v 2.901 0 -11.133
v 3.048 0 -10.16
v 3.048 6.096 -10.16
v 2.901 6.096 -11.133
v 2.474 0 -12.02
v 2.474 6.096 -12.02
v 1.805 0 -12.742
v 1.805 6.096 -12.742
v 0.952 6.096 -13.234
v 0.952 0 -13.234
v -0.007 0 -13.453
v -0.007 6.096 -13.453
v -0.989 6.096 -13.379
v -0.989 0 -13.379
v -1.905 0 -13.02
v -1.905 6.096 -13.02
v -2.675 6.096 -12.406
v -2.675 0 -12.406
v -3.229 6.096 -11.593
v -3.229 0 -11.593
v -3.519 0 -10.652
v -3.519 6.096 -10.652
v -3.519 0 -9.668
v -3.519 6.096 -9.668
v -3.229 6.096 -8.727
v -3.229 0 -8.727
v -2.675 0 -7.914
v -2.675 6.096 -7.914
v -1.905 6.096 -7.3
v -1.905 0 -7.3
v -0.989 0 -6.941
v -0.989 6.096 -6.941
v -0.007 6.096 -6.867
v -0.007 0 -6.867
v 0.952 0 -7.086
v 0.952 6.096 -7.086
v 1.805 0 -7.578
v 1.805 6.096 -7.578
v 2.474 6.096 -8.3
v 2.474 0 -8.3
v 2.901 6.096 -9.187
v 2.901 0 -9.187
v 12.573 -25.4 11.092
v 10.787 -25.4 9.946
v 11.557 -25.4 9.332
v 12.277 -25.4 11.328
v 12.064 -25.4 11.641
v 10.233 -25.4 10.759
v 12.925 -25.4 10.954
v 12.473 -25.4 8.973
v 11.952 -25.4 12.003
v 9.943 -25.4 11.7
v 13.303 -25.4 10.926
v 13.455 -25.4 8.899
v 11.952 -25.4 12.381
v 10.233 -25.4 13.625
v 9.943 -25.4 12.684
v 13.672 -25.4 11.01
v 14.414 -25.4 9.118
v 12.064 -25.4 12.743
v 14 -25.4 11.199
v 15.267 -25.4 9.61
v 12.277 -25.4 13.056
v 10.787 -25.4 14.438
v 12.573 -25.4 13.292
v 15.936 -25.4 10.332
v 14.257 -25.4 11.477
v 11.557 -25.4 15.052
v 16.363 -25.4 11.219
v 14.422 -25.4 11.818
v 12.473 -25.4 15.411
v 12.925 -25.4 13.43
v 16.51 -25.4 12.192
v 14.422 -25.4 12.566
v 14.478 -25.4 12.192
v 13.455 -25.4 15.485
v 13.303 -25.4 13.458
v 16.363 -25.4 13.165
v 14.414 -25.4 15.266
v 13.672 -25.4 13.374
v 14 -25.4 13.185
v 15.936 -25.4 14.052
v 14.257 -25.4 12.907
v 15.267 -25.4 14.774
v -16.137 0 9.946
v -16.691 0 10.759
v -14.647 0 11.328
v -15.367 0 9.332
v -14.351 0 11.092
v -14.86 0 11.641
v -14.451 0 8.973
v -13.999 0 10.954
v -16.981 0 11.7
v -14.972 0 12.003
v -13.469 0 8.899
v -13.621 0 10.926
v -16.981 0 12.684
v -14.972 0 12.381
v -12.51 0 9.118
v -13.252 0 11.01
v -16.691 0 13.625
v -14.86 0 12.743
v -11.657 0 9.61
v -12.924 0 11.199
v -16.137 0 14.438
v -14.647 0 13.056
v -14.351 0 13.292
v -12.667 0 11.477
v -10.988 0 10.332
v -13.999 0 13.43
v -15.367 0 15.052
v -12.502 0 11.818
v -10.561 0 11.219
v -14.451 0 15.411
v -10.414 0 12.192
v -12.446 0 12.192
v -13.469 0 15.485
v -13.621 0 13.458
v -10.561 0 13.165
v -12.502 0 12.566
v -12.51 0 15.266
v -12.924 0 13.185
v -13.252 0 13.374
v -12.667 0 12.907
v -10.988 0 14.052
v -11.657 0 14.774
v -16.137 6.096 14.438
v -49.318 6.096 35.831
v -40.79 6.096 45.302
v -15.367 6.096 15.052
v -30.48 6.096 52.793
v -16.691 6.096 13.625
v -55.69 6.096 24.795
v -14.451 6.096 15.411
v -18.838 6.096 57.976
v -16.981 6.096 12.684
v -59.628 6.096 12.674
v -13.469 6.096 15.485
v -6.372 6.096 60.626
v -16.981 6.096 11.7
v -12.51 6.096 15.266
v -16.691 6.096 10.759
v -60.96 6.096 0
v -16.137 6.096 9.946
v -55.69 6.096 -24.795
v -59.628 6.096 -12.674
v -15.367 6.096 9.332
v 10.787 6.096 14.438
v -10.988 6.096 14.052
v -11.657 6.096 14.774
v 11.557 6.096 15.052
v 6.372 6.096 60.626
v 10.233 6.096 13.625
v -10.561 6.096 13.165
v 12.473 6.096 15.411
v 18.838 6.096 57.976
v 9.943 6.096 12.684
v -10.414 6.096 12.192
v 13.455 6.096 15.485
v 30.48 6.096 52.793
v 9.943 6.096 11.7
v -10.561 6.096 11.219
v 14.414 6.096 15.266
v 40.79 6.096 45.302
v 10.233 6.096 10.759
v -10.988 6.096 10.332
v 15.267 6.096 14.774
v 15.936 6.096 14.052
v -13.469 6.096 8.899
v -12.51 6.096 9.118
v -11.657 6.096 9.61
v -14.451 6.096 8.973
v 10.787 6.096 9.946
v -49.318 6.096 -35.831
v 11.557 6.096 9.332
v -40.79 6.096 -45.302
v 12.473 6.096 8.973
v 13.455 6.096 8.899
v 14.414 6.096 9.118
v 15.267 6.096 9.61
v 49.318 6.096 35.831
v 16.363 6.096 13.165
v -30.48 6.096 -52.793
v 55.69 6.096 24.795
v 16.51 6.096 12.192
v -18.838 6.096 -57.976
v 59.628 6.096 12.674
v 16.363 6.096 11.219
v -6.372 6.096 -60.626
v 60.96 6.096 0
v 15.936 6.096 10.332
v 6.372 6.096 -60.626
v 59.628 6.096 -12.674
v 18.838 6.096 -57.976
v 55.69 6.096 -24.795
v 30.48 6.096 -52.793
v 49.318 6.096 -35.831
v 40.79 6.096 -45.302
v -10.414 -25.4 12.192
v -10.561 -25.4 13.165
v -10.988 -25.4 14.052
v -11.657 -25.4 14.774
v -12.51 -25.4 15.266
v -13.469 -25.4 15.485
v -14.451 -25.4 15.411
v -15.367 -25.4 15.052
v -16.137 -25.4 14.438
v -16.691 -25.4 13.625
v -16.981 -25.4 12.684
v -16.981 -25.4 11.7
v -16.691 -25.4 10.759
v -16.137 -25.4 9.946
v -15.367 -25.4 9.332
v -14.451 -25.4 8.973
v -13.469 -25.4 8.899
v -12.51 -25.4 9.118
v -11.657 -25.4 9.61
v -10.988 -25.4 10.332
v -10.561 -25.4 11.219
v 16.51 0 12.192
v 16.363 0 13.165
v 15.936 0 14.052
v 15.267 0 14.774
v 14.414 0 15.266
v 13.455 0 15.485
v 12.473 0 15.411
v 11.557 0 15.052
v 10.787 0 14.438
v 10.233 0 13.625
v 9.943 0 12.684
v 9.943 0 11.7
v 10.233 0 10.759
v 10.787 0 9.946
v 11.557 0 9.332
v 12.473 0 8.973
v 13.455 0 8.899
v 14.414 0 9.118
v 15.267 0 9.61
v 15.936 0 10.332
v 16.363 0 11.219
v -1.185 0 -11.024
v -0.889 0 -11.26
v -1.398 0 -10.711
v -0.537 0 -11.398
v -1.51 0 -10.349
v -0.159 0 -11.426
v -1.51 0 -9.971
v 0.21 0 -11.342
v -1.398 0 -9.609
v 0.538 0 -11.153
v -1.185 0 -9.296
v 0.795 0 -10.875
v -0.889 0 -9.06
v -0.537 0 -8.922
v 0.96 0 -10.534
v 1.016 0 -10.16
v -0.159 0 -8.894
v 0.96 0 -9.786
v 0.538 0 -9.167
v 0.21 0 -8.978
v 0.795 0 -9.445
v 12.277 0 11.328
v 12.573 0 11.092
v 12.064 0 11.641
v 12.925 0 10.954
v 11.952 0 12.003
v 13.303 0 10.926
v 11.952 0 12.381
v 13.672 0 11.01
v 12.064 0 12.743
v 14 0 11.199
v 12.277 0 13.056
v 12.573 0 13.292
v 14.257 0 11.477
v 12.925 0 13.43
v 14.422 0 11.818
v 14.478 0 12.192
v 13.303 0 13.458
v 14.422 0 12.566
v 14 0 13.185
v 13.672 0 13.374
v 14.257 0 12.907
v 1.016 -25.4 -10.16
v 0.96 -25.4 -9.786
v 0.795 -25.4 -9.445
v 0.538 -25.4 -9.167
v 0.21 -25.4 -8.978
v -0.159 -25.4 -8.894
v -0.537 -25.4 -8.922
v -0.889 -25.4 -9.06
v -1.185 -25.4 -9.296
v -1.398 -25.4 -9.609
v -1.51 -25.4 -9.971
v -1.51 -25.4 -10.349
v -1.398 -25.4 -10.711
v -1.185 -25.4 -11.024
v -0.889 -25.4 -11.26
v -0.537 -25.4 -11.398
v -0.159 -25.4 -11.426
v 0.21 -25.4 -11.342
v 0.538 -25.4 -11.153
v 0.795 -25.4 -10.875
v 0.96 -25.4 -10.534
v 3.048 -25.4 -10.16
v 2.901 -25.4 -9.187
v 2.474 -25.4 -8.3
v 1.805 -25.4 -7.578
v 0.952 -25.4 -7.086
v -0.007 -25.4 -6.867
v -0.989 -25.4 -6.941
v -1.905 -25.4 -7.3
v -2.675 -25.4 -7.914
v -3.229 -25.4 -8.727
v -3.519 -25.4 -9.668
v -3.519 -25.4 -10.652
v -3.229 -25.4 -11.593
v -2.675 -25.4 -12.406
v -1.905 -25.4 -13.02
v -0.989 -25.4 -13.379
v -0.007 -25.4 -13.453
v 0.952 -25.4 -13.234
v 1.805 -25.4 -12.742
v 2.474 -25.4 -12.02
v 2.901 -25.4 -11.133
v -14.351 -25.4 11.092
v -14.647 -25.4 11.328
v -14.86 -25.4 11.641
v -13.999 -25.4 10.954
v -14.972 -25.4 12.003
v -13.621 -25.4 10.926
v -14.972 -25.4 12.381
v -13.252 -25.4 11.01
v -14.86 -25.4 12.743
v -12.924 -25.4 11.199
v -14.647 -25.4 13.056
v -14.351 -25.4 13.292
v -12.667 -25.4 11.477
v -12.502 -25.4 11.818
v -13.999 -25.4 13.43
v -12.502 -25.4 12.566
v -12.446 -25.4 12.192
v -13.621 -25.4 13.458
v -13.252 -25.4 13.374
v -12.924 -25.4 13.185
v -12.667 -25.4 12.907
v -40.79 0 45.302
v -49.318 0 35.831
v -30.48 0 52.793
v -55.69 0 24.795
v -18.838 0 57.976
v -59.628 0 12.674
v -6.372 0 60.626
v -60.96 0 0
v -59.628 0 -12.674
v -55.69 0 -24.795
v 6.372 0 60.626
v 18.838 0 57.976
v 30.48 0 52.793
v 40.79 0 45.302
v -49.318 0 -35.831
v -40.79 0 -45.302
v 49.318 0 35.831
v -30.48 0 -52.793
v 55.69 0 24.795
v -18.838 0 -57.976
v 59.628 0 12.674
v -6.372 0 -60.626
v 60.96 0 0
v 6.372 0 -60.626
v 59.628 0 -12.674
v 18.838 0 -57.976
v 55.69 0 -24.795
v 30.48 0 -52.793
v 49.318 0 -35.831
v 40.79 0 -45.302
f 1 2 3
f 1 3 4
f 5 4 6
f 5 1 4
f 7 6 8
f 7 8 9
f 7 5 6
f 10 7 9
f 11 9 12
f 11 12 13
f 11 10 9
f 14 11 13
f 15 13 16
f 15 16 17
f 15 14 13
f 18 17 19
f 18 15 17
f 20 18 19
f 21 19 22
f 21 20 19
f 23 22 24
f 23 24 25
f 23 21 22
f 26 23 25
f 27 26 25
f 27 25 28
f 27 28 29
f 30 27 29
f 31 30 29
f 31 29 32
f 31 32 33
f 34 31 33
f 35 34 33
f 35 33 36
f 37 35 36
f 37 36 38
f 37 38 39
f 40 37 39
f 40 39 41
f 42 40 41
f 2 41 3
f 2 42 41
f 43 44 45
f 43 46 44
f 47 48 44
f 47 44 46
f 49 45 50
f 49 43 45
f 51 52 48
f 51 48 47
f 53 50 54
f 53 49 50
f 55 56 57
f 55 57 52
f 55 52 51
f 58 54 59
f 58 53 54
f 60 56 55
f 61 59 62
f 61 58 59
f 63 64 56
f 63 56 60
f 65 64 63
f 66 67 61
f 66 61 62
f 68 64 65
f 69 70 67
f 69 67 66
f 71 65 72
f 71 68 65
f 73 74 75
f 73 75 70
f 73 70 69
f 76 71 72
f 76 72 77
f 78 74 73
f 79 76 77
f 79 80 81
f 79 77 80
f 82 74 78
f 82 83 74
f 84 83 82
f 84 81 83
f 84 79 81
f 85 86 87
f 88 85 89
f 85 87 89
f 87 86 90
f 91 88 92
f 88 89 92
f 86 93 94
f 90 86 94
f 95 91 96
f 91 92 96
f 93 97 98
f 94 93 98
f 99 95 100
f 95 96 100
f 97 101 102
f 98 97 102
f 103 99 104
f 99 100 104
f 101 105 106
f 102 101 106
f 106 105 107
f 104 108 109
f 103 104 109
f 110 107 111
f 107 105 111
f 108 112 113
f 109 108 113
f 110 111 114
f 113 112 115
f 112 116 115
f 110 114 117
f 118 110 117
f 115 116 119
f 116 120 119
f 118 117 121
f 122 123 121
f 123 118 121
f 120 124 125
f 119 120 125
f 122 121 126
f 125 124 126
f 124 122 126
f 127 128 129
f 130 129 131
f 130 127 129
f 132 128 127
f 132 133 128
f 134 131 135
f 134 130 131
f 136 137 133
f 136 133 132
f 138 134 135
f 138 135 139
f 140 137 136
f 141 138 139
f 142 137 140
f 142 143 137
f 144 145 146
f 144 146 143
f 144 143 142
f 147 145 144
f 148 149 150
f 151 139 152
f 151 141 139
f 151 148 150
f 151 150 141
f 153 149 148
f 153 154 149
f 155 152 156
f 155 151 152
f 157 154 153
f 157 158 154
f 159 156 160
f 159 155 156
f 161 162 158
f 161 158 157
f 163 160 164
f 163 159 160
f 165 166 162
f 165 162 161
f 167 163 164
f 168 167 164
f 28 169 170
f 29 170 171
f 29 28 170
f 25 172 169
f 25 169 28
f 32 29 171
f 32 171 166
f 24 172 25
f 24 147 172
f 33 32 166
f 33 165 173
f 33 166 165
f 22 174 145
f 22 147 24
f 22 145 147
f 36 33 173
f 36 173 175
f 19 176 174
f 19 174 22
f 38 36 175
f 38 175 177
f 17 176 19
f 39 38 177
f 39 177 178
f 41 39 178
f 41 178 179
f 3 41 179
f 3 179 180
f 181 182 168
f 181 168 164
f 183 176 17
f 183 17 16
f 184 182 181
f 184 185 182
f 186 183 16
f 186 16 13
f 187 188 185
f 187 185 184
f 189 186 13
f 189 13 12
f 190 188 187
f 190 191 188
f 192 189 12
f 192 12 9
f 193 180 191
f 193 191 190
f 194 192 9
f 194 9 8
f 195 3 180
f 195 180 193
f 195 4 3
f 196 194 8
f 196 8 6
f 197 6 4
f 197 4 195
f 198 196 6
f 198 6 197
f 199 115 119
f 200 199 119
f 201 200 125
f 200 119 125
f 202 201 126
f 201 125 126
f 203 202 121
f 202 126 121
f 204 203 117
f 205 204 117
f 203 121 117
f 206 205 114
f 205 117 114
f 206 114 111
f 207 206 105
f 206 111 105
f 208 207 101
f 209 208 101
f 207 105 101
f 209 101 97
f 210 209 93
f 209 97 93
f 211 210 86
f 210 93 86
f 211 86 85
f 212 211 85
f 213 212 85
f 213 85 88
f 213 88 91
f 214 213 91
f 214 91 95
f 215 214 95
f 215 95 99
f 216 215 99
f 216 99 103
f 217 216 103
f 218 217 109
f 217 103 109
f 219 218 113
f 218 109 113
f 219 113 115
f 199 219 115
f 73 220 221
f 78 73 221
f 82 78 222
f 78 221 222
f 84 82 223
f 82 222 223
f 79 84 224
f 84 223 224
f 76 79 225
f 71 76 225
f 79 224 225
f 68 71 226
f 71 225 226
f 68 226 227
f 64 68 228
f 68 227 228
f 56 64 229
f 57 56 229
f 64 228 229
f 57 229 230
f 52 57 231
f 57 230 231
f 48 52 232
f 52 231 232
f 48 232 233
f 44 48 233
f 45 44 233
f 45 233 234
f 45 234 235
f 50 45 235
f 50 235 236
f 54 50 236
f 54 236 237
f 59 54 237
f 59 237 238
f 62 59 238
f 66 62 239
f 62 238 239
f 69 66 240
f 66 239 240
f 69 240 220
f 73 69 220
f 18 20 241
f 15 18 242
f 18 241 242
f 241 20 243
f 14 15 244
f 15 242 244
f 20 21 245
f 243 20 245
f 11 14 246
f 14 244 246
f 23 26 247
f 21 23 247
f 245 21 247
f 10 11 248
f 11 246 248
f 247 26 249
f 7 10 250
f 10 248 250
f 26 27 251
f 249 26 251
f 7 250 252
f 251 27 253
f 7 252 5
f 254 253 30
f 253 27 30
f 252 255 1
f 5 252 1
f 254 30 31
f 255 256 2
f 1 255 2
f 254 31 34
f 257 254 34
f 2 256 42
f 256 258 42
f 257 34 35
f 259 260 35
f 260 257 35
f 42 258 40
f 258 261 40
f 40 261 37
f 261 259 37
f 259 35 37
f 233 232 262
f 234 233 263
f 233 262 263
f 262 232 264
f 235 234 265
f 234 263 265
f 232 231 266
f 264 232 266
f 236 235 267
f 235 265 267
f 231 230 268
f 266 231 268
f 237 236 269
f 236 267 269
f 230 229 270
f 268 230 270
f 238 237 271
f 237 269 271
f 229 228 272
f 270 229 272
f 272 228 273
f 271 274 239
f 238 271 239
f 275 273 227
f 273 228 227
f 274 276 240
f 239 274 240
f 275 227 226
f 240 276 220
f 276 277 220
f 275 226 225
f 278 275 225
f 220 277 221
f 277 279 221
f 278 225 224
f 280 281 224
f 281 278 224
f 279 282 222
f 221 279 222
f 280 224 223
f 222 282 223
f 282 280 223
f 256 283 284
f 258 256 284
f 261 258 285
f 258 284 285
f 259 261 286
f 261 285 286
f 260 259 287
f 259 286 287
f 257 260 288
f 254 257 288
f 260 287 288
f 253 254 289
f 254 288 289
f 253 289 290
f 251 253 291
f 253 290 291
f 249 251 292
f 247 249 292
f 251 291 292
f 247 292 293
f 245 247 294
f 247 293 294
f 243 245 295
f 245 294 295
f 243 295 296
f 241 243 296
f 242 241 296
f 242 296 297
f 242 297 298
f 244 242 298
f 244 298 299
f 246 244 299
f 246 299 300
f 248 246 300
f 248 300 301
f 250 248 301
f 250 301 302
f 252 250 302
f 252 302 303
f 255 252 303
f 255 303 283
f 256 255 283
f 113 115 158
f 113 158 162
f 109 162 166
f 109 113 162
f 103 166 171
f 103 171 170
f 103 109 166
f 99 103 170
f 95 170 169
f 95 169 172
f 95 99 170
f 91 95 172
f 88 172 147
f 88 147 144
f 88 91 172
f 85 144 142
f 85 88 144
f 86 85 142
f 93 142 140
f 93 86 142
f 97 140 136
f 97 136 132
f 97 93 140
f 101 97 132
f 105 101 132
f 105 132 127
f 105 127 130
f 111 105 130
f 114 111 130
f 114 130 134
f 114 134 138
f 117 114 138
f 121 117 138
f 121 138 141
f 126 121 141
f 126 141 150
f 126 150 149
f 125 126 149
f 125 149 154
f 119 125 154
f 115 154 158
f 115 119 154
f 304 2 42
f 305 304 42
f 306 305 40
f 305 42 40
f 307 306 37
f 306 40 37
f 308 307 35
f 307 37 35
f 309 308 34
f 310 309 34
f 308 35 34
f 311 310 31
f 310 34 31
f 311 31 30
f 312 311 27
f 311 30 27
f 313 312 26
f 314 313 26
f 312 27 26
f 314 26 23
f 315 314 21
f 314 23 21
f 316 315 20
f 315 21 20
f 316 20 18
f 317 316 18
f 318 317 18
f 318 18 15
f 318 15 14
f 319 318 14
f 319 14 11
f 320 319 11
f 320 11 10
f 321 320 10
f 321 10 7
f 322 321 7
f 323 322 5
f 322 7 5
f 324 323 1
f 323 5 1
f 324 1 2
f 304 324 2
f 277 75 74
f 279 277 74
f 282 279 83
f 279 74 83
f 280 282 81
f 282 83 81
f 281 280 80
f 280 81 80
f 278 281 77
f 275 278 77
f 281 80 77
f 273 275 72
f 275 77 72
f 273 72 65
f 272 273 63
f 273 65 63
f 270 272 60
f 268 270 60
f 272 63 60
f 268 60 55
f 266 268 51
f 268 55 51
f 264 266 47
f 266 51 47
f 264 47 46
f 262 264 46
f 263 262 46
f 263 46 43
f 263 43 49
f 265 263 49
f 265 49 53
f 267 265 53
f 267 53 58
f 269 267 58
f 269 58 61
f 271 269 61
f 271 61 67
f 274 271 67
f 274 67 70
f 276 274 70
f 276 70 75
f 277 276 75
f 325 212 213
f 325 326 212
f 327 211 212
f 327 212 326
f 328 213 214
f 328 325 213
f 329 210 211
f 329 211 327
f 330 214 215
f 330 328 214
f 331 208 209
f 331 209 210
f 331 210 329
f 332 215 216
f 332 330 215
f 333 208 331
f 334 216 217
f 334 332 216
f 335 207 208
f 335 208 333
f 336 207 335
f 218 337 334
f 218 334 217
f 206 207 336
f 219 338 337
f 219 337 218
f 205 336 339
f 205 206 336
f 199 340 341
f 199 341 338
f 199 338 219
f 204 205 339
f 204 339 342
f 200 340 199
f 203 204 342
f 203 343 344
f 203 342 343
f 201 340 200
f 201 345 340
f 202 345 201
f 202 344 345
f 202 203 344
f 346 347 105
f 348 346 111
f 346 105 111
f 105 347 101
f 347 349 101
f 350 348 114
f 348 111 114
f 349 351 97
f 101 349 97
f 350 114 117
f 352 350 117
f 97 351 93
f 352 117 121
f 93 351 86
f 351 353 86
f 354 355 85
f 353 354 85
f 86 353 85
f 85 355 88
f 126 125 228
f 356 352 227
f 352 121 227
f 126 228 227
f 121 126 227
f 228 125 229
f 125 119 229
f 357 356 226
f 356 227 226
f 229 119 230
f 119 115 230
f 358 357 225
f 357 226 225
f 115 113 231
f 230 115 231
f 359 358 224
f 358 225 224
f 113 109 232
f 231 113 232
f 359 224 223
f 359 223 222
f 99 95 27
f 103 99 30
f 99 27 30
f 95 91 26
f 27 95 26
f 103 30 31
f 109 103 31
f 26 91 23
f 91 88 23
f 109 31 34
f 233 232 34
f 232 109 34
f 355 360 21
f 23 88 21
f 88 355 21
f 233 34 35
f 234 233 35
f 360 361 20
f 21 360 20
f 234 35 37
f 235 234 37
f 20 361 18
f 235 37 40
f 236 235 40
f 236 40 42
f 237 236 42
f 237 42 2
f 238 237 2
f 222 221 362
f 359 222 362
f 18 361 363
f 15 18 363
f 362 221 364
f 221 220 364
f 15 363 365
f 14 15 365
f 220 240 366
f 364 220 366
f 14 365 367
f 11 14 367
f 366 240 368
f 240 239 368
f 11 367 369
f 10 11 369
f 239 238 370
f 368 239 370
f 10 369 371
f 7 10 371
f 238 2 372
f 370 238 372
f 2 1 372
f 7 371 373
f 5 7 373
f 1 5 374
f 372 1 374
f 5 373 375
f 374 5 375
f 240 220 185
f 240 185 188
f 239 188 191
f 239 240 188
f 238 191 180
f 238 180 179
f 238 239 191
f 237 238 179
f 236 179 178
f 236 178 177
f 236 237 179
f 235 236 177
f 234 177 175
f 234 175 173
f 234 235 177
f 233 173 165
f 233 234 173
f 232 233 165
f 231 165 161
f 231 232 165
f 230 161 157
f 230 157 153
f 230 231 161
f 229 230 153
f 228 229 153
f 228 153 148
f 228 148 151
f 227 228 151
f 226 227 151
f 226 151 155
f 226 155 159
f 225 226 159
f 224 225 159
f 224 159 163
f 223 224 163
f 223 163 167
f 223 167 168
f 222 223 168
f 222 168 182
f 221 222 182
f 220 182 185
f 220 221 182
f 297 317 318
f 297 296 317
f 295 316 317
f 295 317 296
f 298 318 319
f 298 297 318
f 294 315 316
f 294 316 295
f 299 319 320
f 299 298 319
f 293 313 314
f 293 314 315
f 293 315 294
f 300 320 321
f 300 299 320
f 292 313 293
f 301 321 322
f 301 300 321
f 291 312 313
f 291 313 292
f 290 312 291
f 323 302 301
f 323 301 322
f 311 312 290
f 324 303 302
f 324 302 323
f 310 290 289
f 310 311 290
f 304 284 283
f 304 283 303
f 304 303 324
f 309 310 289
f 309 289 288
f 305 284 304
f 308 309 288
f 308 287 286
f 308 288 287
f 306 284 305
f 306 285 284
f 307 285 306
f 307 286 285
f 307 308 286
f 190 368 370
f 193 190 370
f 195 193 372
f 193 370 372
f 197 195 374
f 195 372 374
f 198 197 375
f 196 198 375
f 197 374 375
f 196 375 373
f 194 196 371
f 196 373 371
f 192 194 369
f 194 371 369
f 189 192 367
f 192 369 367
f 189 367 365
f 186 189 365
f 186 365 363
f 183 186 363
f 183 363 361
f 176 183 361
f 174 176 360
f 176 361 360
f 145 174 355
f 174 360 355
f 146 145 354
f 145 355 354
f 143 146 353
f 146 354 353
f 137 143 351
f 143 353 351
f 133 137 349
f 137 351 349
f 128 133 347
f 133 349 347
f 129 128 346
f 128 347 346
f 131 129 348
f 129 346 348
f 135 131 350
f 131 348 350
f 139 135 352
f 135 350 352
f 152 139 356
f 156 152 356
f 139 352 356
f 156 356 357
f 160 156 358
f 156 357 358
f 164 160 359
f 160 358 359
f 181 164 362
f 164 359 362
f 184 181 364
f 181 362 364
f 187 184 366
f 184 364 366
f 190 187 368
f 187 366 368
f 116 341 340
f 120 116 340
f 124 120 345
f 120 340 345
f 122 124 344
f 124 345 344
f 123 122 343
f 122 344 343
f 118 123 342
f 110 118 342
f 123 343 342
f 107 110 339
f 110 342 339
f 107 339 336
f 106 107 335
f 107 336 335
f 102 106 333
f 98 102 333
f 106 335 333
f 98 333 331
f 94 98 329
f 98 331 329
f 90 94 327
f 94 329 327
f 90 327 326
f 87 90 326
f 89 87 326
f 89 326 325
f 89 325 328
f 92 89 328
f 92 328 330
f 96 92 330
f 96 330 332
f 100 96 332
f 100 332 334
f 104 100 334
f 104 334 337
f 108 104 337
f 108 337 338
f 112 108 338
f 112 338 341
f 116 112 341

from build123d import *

# Parameters (mm, degrees)
SKETCH1_R             = 60.96
SKETCH1_R_2           = 3.302
EXTRUDE1_DEPTH        = 6.096
SKETCH2_R             = 3.302
BOSS_EXTRUDE1_DEPTH   = 25.4
BOSS_EXTRUDE1_2_DEPTH = 25.4
BOSS_EXTRUDE1_3_DEPTH = 25.4
SKETCH3_R             = 1.27
CUT_EXTRUDE1_DEPTH    = 32.496


with BuildPart() as part:
    # Sketch1 → Extrude1 (new body)
    with BuildSketch(Plane(origin=(0, 0, 0), x_dir=(1, 0, 0), z_dir=(0, 1, 0))):
        Circle(SKETCH1_R)
        with Locations((-0.254, 10.16)):
            Circle(SKETCH1_R_2, mode=Mode.SUBTRACT)
        with Locations((-13.716, -12.192)):
            Circle(SKETCH1_R_2, mode=Mode.SUBTRACT)
        with Locations((13.208, -12.192)):
            Circle(SKETCH1_R_2, mode=Mode.SUBTRACT)
    extrude(amount=EXTRUDE1_DEPTH)


with BuildPart() as body_2:
    # Sketch2 → Boss-Extrude1 (new body)
    with BuildSketch(Plane.XZ):
        with Locations((13.208, 12.192)):
            Circle(SKETCH2_R)
    extrude(amount=BOSS_EXTRUDE1_DEPTH)


with BuildPart() as body_3:
    # Sketch2 → Boss-Extrude1 2 (new body)
    with BuildSketch(Plane.XZ):
        with Locations((-0.254, -10.16)):
            Circle(SKETCH2_R)
    extrude(amount=BOSS_EXTRUDE1_2_DEPTH)


with BuildPart() as body_4:
    # Sketch2 → Boss-Extrude1 3 (new body)
    with BuildSketch(Plane.XZ):
        with Locations((-13.716, 12.192)):
            Circle(SKETCH2_R)
    extrude(amount=BOSS_EXTRUDE1_3_DEPTH)


with BuildPart() as cut_extrude1_tool:
    # Sketch3 → Cut-Extrude1 (new body, through all)
    with BuildSketch(Plane.XZ.offset(25.4)):
        with Locations((-0.254, -10.16)):
            Circle(SKETCH3_R)
        with Locations((13.208, 12.192)):
            Circle(SKETCH3_R)
        with Locations((-13.716, 12.192)):
            Circle(SKETCH3_R)
    extrude(amount=-CUT_EXTRUDE1_DEPTH)


with BuildPart() as body_2_1:
    add(body_2.part)

    # Cut-Extrude1: cut by cut_extrude1_tool
    add(cut_extrude1_tool.part, mode=Mode.SUBTRACT)


with BuildPart() as body_3_1:
    add(body_3.part)

    # Cut-Extrude1: cut by cut_extrude1_tool
    add(cut_extrude1_tool.part, mode=Mode.SUBTRACT)


with BuildPart() as body_4_1:
    add(body_4.part)

    # Cut-Extrude1: cut by cut_extrude1_tool
    add(cut_extrude1_tool.part, mode=Mode.SUBTRACT)


solid = Compound([part.part, body_2_1.part, body_3_1.part, body_4_1.part])
